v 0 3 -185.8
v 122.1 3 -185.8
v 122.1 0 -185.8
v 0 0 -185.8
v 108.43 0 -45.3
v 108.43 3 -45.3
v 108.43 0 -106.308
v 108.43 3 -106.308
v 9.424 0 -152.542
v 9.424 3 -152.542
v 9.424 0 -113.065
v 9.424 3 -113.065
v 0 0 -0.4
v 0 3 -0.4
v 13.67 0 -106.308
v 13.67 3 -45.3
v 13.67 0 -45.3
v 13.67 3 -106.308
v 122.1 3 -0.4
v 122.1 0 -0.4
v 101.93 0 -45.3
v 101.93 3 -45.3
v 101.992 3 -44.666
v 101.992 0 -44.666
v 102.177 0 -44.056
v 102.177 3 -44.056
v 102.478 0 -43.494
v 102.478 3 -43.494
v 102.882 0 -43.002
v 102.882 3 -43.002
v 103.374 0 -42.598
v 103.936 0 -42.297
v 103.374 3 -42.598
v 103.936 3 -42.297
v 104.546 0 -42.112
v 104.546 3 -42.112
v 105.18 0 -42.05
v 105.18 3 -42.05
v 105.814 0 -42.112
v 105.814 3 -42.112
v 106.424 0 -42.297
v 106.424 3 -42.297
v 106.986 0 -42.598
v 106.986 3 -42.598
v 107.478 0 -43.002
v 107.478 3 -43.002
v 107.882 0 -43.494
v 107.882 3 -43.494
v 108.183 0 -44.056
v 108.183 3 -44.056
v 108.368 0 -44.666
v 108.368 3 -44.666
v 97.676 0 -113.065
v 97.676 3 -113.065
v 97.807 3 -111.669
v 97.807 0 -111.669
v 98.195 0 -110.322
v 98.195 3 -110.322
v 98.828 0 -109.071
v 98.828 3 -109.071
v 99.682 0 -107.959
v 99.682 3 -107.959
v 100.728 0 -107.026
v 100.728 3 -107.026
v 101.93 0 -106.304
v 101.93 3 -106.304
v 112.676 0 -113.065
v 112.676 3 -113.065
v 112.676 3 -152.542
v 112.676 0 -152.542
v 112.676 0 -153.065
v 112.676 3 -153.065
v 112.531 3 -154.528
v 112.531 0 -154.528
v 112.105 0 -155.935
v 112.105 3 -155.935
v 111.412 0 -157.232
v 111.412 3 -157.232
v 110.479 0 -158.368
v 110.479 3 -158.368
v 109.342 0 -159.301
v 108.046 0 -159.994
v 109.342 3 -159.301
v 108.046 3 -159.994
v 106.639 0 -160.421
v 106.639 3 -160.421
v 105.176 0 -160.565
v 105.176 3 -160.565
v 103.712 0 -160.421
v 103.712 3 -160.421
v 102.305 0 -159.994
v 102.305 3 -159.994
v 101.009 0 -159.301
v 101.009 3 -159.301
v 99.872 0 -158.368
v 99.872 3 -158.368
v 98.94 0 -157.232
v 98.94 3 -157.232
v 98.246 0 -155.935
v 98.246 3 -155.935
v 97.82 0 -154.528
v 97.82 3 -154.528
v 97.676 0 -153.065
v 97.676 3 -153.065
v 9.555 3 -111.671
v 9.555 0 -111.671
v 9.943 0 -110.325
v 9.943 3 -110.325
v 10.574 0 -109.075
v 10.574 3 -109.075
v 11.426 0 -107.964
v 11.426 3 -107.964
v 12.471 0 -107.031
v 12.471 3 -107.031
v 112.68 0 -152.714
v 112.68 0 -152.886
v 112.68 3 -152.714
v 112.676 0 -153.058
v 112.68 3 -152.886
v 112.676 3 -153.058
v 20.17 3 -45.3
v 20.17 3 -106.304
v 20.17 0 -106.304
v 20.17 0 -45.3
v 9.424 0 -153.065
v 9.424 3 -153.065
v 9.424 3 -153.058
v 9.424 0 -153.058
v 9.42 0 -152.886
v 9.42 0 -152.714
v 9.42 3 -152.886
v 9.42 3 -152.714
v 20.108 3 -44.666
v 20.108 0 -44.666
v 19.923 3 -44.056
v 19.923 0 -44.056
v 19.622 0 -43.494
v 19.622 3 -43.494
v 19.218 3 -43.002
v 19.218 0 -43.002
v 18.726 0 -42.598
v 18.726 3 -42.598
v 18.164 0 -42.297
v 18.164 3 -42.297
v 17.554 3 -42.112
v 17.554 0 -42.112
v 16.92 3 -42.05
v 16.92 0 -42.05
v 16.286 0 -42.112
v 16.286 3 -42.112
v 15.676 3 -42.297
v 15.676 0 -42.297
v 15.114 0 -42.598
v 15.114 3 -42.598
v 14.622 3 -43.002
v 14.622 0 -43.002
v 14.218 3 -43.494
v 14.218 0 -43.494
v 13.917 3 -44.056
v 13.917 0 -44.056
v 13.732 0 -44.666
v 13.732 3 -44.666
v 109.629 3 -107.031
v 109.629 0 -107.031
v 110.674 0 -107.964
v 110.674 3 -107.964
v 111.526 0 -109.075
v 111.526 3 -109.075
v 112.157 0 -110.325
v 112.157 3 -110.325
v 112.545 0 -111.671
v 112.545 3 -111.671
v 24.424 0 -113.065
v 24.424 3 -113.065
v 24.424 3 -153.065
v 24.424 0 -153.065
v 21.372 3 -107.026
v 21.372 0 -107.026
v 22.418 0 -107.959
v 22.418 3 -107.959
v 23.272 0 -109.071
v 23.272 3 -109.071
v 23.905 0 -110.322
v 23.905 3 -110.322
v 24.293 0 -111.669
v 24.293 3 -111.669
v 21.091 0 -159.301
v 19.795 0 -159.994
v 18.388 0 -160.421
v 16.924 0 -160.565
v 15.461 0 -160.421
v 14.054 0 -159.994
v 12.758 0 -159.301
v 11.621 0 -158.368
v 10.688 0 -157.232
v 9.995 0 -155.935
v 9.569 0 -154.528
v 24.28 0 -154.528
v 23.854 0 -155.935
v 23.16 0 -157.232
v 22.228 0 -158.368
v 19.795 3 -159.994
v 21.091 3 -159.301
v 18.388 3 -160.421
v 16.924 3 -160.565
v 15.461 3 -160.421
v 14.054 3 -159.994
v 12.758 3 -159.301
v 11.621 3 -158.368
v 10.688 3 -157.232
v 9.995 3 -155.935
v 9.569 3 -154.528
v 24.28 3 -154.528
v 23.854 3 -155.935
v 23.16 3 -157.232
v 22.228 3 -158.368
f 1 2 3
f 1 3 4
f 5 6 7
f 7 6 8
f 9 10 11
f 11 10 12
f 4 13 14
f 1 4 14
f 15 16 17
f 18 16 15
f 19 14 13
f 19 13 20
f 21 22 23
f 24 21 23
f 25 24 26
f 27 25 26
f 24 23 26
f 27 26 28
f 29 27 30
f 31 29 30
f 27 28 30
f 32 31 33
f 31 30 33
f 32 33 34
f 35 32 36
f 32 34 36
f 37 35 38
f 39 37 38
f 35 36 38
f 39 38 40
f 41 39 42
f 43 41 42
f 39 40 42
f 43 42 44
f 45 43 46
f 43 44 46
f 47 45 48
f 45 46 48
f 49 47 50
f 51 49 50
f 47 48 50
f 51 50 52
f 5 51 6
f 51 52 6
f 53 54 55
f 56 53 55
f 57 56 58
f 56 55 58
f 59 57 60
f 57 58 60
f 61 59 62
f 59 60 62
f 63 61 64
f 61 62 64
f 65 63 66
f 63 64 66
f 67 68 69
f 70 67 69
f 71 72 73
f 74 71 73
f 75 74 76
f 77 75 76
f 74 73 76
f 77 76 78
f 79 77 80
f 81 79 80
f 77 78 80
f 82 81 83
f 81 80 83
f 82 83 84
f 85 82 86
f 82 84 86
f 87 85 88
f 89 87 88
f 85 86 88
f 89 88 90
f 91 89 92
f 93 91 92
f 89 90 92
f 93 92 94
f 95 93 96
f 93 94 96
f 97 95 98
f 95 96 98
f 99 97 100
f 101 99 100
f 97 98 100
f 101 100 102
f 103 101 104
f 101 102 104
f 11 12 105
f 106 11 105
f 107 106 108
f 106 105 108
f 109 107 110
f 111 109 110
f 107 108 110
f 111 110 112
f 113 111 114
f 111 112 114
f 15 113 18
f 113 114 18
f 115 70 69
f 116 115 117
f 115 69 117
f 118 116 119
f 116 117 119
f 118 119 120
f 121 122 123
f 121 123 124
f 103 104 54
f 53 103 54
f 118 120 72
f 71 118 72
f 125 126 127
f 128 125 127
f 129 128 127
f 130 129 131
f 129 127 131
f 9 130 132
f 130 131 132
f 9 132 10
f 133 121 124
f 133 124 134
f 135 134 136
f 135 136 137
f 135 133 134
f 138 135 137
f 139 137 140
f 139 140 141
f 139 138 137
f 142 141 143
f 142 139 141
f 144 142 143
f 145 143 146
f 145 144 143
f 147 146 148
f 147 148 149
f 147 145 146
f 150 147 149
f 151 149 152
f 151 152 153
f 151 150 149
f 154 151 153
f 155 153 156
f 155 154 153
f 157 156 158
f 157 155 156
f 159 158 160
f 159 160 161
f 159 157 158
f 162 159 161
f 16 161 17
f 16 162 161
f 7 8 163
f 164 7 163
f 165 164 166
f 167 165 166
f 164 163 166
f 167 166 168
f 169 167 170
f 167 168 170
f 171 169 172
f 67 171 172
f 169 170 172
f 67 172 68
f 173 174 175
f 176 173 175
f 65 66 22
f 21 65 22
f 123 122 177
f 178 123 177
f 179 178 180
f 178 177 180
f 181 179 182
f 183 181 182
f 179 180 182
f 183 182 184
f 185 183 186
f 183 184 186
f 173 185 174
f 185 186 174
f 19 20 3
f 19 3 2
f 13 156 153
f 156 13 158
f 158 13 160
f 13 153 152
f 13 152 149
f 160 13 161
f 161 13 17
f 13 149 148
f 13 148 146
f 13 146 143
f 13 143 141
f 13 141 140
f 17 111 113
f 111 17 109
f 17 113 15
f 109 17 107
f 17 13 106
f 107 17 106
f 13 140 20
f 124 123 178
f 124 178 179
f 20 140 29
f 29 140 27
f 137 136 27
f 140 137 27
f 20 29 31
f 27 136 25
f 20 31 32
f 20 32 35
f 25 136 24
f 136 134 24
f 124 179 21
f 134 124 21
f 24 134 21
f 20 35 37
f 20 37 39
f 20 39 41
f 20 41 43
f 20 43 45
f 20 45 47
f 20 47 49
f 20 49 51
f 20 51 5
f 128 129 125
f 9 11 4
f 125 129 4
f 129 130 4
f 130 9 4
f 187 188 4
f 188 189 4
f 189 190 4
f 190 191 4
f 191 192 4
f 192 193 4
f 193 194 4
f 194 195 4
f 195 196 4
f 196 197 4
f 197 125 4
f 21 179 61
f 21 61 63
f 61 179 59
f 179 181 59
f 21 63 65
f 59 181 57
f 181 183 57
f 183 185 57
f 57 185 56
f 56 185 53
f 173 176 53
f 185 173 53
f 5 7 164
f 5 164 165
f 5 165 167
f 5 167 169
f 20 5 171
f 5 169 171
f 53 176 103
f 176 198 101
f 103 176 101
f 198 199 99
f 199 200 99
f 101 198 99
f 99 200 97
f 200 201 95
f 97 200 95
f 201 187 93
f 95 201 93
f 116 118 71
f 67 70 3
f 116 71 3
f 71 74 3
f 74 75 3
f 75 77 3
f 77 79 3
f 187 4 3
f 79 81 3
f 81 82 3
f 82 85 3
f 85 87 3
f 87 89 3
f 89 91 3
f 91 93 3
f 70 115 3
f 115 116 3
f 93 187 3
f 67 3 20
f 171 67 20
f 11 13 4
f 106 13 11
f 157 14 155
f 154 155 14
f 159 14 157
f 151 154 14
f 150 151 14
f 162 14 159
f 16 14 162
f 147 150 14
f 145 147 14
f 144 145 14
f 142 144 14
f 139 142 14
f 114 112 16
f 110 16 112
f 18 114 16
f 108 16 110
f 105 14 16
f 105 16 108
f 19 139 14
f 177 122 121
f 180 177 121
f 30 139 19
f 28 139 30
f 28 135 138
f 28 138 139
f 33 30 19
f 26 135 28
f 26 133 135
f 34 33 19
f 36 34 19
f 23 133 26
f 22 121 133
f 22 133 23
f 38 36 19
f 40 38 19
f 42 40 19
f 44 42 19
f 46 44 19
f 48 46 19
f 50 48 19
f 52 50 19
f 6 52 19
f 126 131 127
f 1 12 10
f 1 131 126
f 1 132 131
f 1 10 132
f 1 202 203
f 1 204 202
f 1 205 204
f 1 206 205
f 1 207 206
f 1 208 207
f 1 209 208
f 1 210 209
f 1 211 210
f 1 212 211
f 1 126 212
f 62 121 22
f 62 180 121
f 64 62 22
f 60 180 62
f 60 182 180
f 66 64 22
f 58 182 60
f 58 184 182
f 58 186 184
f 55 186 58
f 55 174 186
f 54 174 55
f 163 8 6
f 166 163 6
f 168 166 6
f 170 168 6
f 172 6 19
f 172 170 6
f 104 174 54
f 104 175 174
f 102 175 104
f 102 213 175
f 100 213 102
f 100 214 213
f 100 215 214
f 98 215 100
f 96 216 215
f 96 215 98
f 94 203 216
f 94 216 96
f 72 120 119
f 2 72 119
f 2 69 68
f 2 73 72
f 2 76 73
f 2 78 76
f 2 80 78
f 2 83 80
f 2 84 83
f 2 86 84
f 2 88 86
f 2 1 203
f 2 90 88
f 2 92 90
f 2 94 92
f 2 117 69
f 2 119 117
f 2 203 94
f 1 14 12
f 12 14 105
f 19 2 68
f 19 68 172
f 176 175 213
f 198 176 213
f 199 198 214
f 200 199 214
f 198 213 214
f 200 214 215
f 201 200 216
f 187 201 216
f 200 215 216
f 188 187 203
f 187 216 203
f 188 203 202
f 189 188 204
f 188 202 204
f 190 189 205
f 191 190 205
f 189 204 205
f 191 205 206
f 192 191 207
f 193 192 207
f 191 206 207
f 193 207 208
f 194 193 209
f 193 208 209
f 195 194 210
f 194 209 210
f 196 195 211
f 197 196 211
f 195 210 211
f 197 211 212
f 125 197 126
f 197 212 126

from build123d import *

# Parameters (mm, degrees)
SKETCH3_W           = 122.1
SKETCH3_H           = 197.8
BOSS_EXTRUDE2_DEPTH = 3
SKETCH4_R           = 7.5
CUT_EXTRUDE2_DEPTH  = 3
SKETCH5_W           = 185.639017853
SKETCH5_H           = 93.814581834
CUT_EXTRUDE3_DEPTH  = 12
SKETCH7_W           = 181.97184254
SKETCH7_H           = 161.609726855
CUT_EXTRUDE4_DEPTH  = 19
CUT_EXTRUDE8_DEPTH  = 10
SKETCH10_W          = 122.1
SKETCH10_H          = 3
BOSS_EXTRUDE3_DEPTH = 18.6


with BuildPart() as part:
    # Sketch3 → Boss-Extrude2 (new body)
    with BuildSketch(Plane(origin=(0, 0, 0), x_dir=(1, 0, 0), z_dir=(0, 1, 0))):
        with Locations((61.05, 98.9)):
            Rectangle(SKETCH3_W, SKETCH3_H)
    extrude(amount=BOSS_EXTRUDE2_DEPTH)

    # Sketch4 → Cut-Extrude2 (cut)
    with BuildSketch(Plane(origin=(0, 3, 0), x_dir=(1, 0, 0), z_dir=(0, 1, 0))):
        with Locations((16.92, 152.8)):
            Circle(SKETCH4_R)
        with Locations((105.18, 152.8)):
            Circle(SKETCH4_R)
        with BuildLine():
            Line((20.17, 145.3), (20.17, 45.3))
            ThreePointArc((20.17, 45.3), (16.92, 42.05), (13.67, 45.3))
            Line((13.67, 45.3), (13.67, 145.3))
            ThreePointArc((13.67, 145.3), (16.92, 148.55), (20.17, 145.3))
        make_face()
        with BuildLine():
            Line((101.93, 145.3), (101.93, 45.3))
            ThreePointArc((101.93, 45.3), (105.18, 42.05), (108.43, 45.3))
            Line((108.43, 45.3), (108.43, 145.3))
            ThreePointArc((108.43, 145.3), (105.18, 148.55), (101.93, 145.3))
        make_face()
    extrude(amount=-CUT_EXTRUDE2_DEPTH, mode=Mode.SUBTRACT)

    # Sketch5 → Cut-Extrude3 (cut)
    with BuildSketch(Plane(origin=(0, 0, -197.8), x_dir=(-1, 0, 0), z_dir=(0, 0, -1))):
        with Locations((-62.393879106, -6.143731482)):
            Rectangle(SKETCH5_W, SKETCH5_H)
    extrude(amount=-CUT_EXTRUDE3_DEPTH, mode=Mode.SUBTRACT)

    # Sketch7 → Cut-Extrude4 (cut)
    with BuildSketch(Plane.XY):
        with Locations((66.543858185, 9.384028943)):
            Rectangle(SKETCH7_W, SKETCH7_H)
    extrude(amount=-CUT_EXTRUDE4_DEPTH, mode=Mode.SUBTRACT)

    # Sketch8 → Cut-Extrude8 (cut)
    with BuildSketch(Plane(origin=(0, 3, 0), x_dir=(1, 0, 0), z_dir=(0, 1, 0))):
        with BuildLine():
            ThreePointArc((13.67, 106.308017417), (16.91951533, 105.565143685), (20.17, 106.303764471))
            Line((20.17, 106.303764471), (20.17, 145.3))
            ThreePointArc((20.17, 145.3), (20.150641933, 145.654193023), (20.09279834, 146.004166667))
            ThreePointArc((20.09279834, 146.004166667), (21.056311174, 159.056271243), (9.424422573, 153.057524837))
            Line((9.424422573, 153.057524837), (9.424422573, 152.542475163))
            ThreePointArc((9.424422573, 152.542475163), (10.663728757, 148.663688826), (13.74720166, 146.004166667))
            ThreePointArc((13.74720166, 146.004166667), (13.689358067, 145.654193023), (13.67, 145.3))
            Line((13.67, 145.3), (13.67, 106.308017417))
        make_face()
        with BuildLine():
            ThreePointArc((112.675577427, 153.06514208), (105.175577427, 160.56514208), (97.675577427, 153.06514208))
            Line((97.675577427, 153.06514208), (97.675577427, 113.06514208))
            ThreePointArc((97.675577427, 113.06514208), (98.827671051, 109.070885622), (101.93, 106.303764471))
            Line((101.93, 106.303764471), (101.93, 145.3))
            ThreePointArc((101.93, 145.3), (101.949358067, 145.654193023), (102.00720166, 146.004166667))
            ThreePointArc((102.00720166, 146.004166667), (101.043688826, 159.056271243), (112.675577427, 153.057524837))
            Line((112.675577427, 153.057524837), (112.675577427, 153.06514208))
        make_face()
        with BuildLine():
            Line((108.43, 145.3), (108.43, 106.308017417))
            ThreePointArc((108.43, 106.308017417), (111.526095882, 109.075039907), (112.675577427, 113.06514208))
            Line((112.675577427, 113.06514208), (112.675577427, 152.542475163))
            ThreePointArc((112.675577427, 152.542475163), (111.436271243, 148.663688826), (108.35279834, 146.004166667))
            ThreePointArc((108.35279834, 146.004166667), (108.410641933, 145.654193023), (108.43, 145.3))
        make_face()
        with BuildLine():
            ThreePointArc((9.424422573, 113.06514208), (10.573904118, 109.075039907), (13.67, 106.308017417))
            Line((13.67, 106.308017417), (13.67, 145.3))
            ThreePointArc((13.67, 145.3), (13.689358067, 145.654193023), (13.74720166, 146.004166667))
            ThreePointArc((13.74720166, 146.004166667), (10.663728757, 148.663688826), (9.424422573, 152.542475163))
            Line((9.424422573, 152.542475163), (9.424422573, 113.06514208))
        make_face()
        with BuildLine():
            Line((24.424422573, 113.06514208), (24.424422573, 153.06514208))
            ThreePointArc((24.424422573, 153.06514208), (16.924422573, 160.56514208), (9.424422573, 153.06514208))
            Line((9.424422573, 153.06514208), (9.424422573, 153.057524837))
            ThreePointArc((9.424422573, 153.057524837), (21.056311174, 159.056271243), (20.09279834, 146.004166667))
            ThreePointArc((20.09279834, 146.004166667), (20.150641933, 145.654193023), (20.17, 145.3))
            Line((20.17, 145.3), (20.17, 106.303764471))
            ThreePointArc((20.17, 106.303764471), (23.272328949, 109.070885622), (24.424422573, 113.06514208))
        make_face()
    extrude(amount=-CUT_EXTRUDE8_DEPTH, mode=Mode.SUBTRACT)

    # Sketch10 → Boss-Extrude3 (add)
    with BuildSketch(Plane.XY.offset(-19)):
        with Locations((61.05, 1.5)):
            Rectangle(SKETCH10_W, SKETCH10_H)
    extrude(amount=BOSS_EXTRUDE3_DEPTH)


solid = part.part
